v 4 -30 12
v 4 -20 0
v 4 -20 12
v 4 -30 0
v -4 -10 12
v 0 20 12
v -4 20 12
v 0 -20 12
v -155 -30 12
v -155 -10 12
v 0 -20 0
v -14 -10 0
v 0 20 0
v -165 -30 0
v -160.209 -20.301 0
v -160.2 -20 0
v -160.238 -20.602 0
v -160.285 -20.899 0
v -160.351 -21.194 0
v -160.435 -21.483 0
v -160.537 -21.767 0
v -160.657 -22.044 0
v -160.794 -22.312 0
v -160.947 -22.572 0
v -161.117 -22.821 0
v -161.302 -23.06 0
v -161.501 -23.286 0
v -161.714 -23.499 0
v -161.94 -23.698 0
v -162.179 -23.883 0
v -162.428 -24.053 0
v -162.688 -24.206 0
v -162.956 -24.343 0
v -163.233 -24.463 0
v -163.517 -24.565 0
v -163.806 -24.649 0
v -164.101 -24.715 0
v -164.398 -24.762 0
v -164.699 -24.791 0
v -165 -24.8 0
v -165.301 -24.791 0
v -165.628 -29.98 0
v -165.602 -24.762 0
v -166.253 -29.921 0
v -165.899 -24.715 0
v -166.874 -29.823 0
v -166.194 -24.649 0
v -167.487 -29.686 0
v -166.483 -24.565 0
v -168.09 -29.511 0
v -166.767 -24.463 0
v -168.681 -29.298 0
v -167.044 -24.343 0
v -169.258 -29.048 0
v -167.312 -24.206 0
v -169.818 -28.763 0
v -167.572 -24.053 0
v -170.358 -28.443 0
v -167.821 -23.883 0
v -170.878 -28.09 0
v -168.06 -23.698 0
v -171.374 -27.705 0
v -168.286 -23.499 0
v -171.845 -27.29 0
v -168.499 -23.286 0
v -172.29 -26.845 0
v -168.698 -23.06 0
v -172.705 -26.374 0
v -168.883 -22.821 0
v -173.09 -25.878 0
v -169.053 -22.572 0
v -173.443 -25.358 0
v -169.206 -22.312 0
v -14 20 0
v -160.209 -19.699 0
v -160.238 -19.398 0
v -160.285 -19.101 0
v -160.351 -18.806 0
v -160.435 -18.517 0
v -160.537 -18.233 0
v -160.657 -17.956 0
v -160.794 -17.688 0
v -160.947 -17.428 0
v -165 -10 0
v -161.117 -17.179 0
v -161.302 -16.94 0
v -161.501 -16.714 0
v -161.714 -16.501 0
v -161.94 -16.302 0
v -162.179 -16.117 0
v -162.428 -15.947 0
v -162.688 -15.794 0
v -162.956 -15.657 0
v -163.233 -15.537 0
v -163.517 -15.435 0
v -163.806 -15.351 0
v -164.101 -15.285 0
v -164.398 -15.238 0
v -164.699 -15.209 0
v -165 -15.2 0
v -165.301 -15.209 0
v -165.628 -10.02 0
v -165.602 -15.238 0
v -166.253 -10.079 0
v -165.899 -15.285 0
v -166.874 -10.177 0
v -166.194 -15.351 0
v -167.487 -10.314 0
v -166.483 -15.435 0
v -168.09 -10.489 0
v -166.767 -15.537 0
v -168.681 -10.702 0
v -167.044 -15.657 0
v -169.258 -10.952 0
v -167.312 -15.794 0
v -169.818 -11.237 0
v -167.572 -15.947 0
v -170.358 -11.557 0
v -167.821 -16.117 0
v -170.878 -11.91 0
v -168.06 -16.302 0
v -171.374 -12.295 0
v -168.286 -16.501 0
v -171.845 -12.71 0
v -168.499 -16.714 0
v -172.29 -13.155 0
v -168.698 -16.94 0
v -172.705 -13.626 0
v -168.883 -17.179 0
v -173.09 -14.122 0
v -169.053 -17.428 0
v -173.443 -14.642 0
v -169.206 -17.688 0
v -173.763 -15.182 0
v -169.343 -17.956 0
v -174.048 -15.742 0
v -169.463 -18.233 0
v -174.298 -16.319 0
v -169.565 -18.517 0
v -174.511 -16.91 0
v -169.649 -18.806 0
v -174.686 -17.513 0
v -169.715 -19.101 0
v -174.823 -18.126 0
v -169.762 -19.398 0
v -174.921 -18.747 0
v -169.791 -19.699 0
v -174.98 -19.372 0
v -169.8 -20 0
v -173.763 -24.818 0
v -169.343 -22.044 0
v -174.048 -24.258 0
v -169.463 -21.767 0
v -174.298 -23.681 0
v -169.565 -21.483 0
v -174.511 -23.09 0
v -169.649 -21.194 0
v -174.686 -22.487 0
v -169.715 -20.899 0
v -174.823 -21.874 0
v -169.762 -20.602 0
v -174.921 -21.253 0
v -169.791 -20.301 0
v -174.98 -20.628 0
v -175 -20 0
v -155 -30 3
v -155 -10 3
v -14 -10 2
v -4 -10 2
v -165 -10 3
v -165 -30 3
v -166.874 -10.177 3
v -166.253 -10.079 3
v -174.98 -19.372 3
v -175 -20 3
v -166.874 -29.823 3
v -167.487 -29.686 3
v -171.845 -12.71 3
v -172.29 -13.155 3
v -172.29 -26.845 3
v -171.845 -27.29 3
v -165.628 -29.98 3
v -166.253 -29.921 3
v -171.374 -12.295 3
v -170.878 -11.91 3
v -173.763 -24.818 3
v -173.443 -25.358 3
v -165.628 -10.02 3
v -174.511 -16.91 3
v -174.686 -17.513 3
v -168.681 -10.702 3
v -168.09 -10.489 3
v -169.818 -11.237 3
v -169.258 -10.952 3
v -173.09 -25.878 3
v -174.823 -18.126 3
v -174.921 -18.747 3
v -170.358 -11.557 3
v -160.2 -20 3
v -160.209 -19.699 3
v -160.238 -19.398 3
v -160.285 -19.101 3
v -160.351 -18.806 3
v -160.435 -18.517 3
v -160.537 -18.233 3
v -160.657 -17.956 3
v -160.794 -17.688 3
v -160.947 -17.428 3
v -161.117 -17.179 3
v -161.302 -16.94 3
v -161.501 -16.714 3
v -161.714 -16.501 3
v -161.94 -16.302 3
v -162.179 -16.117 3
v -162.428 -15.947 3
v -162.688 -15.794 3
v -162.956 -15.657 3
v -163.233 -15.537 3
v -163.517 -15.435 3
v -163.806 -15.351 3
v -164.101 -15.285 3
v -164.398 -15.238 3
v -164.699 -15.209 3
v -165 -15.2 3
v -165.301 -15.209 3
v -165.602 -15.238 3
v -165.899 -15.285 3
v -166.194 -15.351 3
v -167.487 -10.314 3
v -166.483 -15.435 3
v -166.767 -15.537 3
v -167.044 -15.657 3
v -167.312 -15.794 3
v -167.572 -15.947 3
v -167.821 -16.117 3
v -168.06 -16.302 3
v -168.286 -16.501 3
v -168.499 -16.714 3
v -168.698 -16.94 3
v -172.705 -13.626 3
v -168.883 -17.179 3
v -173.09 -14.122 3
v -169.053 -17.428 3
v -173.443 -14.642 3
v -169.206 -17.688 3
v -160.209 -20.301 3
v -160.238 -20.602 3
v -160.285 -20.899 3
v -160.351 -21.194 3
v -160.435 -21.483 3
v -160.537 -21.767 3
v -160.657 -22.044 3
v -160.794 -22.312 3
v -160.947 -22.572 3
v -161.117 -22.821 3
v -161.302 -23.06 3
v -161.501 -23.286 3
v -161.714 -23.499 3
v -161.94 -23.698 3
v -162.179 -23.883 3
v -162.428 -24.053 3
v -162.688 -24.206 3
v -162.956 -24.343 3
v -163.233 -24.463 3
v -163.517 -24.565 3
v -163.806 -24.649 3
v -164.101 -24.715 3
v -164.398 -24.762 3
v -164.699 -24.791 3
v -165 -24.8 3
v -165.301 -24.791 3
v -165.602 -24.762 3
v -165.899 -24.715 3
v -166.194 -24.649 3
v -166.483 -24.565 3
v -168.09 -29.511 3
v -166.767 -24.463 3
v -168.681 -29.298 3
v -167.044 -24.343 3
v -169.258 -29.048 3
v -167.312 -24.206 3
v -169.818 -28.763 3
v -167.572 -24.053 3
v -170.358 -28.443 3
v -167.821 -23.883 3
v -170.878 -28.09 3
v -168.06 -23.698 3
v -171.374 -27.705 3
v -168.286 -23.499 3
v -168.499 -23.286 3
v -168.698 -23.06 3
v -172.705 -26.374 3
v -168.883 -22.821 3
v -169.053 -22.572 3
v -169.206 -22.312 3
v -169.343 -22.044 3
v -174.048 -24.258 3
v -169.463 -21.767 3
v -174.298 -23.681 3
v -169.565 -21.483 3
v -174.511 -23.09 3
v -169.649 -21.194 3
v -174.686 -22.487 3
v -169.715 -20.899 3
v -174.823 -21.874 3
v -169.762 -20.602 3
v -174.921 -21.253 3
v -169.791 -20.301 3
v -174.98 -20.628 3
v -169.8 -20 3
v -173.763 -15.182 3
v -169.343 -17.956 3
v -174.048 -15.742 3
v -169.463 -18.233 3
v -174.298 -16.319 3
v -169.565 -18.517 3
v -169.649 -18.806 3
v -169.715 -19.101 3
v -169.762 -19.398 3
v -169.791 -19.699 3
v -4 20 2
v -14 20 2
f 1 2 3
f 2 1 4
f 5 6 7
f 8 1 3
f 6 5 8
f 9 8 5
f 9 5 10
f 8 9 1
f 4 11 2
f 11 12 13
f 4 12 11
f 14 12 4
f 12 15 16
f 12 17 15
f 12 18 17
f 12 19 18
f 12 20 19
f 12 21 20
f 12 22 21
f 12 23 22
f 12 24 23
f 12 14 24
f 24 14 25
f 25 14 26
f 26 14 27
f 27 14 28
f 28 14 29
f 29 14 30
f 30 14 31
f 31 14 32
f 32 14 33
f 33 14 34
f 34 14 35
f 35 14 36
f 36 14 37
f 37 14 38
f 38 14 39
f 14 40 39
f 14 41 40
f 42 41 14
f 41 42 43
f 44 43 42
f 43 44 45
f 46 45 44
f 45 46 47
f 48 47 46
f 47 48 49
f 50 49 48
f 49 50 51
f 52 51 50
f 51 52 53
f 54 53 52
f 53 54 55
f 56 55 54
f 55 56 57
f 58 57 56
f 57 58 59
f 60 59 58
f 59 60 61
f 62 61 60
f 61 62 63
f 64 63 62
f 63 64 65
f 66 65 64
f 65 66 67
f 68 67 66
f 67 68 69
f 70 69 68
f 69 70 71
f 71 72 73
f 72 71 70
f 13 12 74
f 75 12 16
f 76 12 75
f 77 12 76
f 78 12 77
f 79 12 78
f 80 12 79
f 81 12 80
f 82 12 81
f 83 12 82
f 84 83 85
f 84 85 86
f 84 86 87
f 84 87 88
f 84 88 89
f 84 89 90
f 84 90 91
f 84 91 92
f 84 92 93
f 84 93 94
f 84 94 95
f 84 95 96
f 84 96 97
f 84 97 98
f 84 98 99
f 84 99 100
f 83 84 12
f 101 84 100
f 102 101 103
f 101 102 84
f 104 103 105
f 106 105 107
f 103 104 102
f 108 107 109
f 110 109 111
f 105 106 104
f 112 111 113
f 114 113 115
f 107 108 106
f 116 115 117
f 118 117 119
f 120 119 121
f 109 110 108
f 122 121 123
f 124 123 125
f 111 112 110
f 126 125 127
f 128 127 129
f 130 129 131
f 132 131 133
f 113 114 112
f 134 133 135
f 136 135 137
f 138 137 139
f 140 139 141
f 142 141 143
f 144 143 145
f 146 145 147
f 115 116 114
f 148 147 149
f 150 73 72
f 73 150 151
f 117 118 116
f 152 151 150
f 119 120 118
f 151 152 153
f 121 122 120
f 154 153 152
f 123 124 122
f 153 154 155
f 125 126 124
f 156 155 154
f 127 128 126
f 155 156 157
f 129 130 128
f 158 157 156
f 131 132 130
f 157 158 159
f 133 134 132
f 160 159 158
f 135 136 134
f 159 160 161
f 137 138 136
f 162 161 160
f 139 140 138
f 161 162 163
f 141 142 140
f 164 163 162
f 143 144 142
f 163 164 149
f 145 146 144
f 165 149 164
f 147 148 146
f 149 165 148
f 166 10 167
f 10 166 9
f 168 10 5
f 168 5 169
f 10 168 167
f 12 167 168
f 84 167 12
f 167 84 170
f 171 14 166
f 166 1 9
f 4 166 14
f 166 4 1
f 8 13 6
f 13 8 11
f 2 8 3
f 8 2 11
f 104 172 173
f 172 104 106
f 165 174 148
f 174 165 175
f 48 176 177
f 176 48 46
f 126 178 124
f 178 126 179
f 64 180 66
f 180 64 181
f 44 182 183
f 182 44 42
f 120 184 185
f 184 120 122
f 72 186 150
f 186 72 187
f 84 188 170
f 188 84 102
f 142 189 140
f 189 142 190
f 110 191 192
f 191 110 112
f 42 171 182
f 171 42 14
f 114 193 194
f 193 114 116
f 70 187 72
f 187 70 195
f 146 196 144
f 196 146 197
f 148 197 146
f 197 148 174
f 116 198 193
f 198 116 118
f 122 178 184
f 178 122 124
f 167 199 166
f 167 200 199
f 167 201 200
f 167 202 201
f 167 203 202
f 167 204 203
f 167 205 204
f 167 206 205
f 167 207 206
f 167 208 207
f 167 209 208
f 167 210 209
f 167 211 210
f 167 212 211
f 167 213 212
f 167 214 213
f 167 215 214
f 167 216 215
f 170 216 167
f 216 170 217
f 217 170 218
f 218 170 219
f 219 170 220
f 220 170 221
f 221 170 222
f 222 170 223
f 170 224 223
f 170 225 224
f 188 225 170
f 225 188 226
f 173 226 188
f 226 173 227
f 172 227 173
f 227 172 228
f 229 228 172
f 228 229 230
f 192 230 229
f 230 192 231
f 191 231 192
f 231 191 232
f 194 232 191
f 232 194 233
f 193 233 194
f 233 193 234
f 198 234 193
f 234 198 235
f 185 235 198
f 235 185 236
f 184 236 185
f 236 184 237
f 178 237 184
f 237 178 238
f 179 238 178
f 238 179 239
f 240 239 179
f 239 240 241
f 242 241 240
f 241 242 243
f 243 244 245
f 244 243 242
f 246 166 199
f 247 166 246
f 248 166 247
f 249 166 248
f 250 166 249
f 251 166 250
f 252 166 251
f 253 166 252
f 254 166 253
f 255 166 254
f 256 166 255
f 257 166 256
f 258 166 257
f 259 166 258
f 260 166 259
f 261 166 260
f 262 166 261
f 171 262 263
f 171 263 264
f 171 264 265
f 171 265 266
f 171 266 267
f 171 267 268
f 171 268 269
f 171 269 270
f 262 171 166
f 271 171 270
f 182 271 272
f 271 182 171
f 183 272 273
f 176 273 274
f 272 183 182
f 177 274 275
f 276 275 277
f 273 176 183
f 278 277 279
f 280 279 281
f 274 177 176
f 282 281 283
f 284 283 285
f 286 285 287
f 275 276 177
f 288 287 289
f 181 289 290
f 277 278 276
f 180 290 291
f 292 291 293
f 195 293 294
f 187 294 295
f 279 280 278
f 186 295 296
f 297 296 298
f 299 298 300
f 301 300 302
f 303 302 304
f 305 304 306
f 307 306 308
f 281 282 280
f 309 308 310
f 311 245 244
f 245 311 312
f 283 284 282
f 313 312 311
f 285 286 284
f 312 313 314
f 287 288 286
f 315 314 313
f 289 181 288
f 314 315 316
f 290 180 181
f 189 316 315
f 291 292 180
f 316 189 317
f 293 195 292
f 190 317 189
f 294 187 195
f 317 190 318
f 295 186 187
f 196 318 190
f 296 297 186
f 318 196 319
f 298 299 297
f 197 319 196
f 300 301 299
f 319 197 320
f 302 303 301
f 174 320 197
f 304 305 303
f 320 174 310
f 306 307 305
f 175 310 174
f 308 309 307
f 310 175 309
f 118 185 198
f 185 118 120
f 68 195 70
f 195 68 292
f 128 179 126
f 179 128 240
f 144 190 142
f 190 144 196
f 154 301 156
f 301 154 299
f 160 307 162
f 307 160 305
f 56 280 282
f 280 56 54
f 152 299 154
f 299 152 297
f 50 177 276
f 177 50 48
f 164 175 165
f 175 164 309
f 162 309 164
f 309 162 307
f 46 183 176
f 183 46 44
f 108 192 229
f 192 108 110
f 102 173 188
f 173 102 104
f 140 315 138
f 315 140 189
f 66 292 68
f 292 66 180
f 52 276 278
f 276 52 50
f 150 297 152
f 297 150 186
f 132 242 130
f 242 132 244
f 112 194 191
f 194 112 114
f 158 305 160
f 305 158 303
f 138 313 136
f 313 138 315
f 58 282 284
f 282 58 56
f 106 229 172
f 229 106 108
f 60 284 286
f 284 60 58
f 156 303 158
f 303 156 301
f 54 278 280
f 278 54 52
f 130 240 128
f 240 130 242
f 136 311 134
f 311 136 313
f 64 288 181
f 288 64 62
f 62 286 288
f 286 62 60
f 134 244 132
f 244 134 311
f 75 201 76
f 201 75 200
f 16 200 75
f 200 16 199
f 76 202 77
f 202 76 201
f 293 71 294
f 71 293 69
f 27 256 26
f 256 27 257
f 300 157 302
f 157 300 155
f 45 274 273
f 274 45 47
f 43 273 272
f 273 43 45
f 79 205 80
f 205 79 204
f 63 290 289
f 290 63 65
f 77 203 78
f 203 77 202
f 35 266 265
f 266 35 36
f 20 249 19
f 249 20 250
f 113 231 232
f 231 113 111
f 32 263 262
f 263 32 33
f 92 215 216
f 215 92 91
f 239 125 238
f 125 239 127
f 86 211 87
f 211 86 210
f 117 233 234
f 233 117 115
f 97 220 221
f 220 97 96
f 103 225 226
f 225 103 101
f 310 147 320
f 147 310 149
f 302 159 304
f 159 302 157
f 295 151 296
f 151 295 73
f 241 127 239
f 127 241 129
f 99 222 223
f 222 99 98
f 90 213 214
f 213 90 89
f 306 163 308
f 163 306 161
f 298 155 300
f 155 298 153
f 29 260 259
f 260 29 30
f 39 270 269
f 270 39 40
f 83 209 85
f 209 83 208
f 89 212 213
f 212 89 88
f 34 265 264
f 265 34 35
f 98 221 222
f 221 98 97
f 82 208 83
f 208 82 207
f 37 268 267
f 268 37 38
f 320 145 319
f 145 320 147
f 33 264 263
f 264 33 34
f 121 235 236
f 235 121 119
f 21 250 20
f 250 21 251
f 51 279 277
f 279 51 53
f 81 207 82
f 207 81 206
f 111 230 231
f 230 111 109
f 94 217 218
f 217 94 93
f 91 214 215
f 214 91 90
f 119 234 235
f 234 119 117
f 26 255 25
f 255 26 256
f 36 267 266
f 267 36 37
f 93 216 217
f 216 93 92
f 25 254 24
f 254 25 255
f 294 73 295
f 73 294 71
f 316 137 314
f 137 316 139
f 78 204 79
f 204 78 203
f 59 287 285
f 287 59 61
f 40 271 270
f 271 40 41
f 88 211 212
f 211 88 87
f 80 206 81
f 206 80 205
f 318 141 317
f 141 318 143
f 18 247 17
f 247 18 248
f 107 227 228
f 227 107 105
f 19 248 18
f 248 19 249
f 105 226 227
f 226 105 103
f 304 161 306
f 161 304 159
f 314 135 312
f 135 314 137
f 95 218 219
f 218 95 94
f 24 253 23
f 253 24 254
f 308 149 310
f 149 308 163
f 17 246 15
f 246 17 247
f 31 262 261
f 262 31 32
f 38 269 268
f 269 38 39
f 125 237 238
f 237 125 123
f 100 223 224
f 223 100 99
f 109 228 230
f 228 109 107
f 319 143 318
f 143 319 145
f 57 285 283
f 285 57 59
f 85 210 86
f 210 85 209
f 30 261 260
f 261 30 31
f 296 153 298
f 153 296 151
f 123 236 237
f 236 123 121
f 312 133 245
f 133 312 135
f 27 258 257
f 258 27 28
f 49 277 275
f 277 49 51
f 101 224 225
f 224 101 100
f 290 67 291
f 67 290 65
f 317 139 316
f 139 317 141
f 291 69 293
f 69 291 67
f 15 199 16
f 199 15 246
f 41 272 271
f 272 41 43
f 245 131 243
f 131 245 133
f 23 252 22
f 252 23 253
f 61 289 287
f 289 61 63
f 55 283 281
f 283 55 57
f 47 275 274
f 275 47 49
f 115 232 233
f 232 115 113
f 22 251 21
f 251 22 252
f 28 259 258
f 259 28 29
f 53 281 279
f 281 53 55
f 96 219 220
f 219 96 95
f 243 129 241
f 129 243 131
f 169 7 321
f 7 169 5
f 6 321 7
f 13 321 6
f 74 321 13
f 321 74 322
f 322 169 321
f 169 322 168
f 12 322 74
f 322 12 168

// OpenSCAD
$fn=100;

boolOpOffset1 = $preview ? 0.01 : 0;
boolOpOffset2 = $preview ? 0.02 : 0;


//rotate([0, 0, 90])
//	translate([6, -7.35, -1.35])
//		import("/Users/benmens/Downloads/Cable_chain 2/cablechain-1.STL");
//
//translate([0, -30, 0])
//	cube([60, 60, 5]);
//
//translate([0, 6, 5])
//	cube([25, 4, 11.4]);
//
//translate([40, -30, 5])
//	cube([4, 40, 11.4]);
//
//translate([25, 4, 5])
//difference() {
//	cylinder(11.4, 6, 6);
//	
//	translate([ 0, 0, -boolOpOffset])
//		cylinder(12, 2, 2);
//	
//	translate([-14, -18, -boolOpOffset])
//		cube([14, 28, 12]);
//
//	translate([-14, -14, -boolOpOffset])
//		cube([28, 14, 12]);
//}
//
//
//translate([0, 20, 5])
//	cube([30, 4, 11.4]);
//
//translate([27, -30, 5])
//	cube([4, 34, 11.4]);
//
//
//translate([30, 10, 5])
//difference() {
//	cylinder(11.4, 14, 14);
//	
//	translate([ 0, 0, -boolOpOffset])
//		cylinder(12, 10, 10);
//	
//	translate([-14, -18, -boolOpOffset])
//		cube([14, 28, 12]);
//
//	translate([-14, -14, -boolOpOffset])
//		cube([28, 14, 12]);
//}

thickness = 2;

module groundPlate () {

    difference() {
	
	union() {
	
		difference() {
			cube([65, 85, thickness]);
			
			translate([39.5, -boolOpOffset1, -boolOpOffset1])
				cube([26 + boolOpOffset1, 52 + boolOpOffset1, thickness + boolOpOffset2]);
			
			translate([65 -4.5 - 9, 79 + boolOpOffset1, -boolOpOffset1])
				cube([9, 6, thickness + boolOpOffset2]);
			
			translate([-boolOpOffset1, 43, -boolOpOffset1])
				cube([10, 9, thickness + boolOpOffset2]);
			
			translate([39, 43, -boolOpOffset1])
				cube([10, 9, thickness + boolOpOffset2]);
			
			translate([47, 85, -boolOpOffset1]) rotate([0, 0, 120]) cube([65, 85, thickness  +boolOpOffset2]);
			}

			translate([39.5, 0, 0]) cube([10, 43, thickness]);
		}
	
		
		translate([17, 9, -boolOpOffset1]) 
            cylinder(thickness + boolOpOffset2, 5.5, 5.5);

		translate([16 + 17 + 4.5, 8, -boolOpOffset1]) 
            cylinder(thickness + boolOpOffset2, 5, 5);
		
		translate([24.5, 43 + 4.5, -boolOpOffset1]) 
            cylinder(thickness + boolOpOffset2, 1.6, 1.6);

		translate([24.5, 43 + 4.5, -2]) 
            cylinder(thickness + boolOpOffset2, 3, 3);

		translate([65 -4.5 - 4.5, 70, -boolOpOffset1]) 
            cylinder(thickness + boolOpOffset2, 1.6, 1.6);
	
		translate([65 -4.5 - 4.5, 70, -2]) 
            cylinder(thickness + boolOpOffset2, 3, 3);
	
		translate([0 - boolOpOffset1, 0 - boolOpOffset1, -boolOpOffset1]) difference() {
			cube([10 + boolOpOffset1, 10 + boolOpOffset1, thickness + boolOpOffset2]);
			
			translate([10, 10, 0])
				cylinder(thickness + boolOpOffset1, 10, 10);
		}

		translate([39.5 + boolOpOffset1, 0 - boolOpOffset1, -boolOpOffset1]) difference() {
			cube([10 + boolOpOffset1, 10 + boolOpOffset1, thickness + boolOpOffset2]);
			
			translate([0, 10, 0])
				cylinder(thickness + boolOpOffset1, 10, 10);
		}

	}

}


// groundPlate();
// translate([4, 0, 0])
// difference() {
// //	translate([38.15, 20, 17.75 + thickness])
// //		rotate([0, 180, 270])
	
// 	translate([42.7, 25, 13.2 + thickness])
// 		rotate([0, 180, 270])		
// 			import("/Users/benmens/Downloads/Cable_Chain/CableChain.stl");

// 	translate([28, 10, thickness + boolOpOffset1])
// 		cube([11, 30, 16]);
	
	
// }
	

// module corner(r, h, d) {
	
// 	difference() {
// 		cylinder(h, r, r);

// 		translate([0, 0, -boolOpOffset1])
// 			cylinder(h + boolOpOffset2, r-d, r-d);
		
// 		translate([-r - boolOpOffset1 , 0, -boolOpOffset1])
// 			cube([2*r + boolOpOffset2, r + boolOpOffset1, h + boolOpOffset2]);

// 		translate([0, -r - boolOpOffset1, -boolOpOffset1])
// 			cube([r + boolOpOffset2, 2*r + boolOpOffset1, h + boolOpOffset2]);
// 	}
		
	
// }

// translate([40, 32.2, thickness])
// 	cube([9.5, 4, 13.2]);

// translate([40, 42.2, thickness])
// 	corner(10, 13.2, 4);

// translate([30, 42.2, thickness])
// 	cube([4, 31, 13.2]);


// translate([22, 13.77, thickness])
// 	cube([27.4, 4, 13.2]);

// translate([22, 23.77, thickness])
// 	corner(10, 13.2, 4);

// translate([12, 23.77, thickness])
// 	cube([4, 38, 13.2]);


// rotate([0, 180, 0])
//     groundPlate();

// difference() {
//     cube([20, 20, 2]);

//     translate([10, 10, -1])
//         cylinder(4, 4.9, 4.9);
// }


width = 40;
width2 = 10;
length = 100;

module plate1() {
    linear_extrude(2)
    polygon([
        [0, -width/2],
        [0, width/2],
        [length, width2],
        [length, -width2]
    ]);


    translate([0, -1, 2])
        cube([length - 10, 4, 5]);

    translate([0, -width / 2, 2])
        cube([4, width, 10]);

    translate([length, 0, 0])
       cylinder(2, 20, 20);

}


// difference() {
//     plate1();

//     translate([length, 0, -1])
//        cylinder(4, 4.9, 4.9);

// }

translate([-4, -width/2, 0])
    cube([4, width, 12]);

translate([-14, -width/2, 0])
    cube([14, width, 2]);

difference() {
    translate([-155, -width/2 - 10, 0])
        cube([159, 20, 12]);    

    translate([0, -width/2, 0])
        cube([4, width, 12]);
}


translate([-165, -width/2 , 0])
    difference() {
        union() {
            cylinder(3, 10,10);

            translate([0, -10, 0])
                cube([15, 20, 3]);    
        }

        cylinder(4, 4.8, 4.8);
    }
